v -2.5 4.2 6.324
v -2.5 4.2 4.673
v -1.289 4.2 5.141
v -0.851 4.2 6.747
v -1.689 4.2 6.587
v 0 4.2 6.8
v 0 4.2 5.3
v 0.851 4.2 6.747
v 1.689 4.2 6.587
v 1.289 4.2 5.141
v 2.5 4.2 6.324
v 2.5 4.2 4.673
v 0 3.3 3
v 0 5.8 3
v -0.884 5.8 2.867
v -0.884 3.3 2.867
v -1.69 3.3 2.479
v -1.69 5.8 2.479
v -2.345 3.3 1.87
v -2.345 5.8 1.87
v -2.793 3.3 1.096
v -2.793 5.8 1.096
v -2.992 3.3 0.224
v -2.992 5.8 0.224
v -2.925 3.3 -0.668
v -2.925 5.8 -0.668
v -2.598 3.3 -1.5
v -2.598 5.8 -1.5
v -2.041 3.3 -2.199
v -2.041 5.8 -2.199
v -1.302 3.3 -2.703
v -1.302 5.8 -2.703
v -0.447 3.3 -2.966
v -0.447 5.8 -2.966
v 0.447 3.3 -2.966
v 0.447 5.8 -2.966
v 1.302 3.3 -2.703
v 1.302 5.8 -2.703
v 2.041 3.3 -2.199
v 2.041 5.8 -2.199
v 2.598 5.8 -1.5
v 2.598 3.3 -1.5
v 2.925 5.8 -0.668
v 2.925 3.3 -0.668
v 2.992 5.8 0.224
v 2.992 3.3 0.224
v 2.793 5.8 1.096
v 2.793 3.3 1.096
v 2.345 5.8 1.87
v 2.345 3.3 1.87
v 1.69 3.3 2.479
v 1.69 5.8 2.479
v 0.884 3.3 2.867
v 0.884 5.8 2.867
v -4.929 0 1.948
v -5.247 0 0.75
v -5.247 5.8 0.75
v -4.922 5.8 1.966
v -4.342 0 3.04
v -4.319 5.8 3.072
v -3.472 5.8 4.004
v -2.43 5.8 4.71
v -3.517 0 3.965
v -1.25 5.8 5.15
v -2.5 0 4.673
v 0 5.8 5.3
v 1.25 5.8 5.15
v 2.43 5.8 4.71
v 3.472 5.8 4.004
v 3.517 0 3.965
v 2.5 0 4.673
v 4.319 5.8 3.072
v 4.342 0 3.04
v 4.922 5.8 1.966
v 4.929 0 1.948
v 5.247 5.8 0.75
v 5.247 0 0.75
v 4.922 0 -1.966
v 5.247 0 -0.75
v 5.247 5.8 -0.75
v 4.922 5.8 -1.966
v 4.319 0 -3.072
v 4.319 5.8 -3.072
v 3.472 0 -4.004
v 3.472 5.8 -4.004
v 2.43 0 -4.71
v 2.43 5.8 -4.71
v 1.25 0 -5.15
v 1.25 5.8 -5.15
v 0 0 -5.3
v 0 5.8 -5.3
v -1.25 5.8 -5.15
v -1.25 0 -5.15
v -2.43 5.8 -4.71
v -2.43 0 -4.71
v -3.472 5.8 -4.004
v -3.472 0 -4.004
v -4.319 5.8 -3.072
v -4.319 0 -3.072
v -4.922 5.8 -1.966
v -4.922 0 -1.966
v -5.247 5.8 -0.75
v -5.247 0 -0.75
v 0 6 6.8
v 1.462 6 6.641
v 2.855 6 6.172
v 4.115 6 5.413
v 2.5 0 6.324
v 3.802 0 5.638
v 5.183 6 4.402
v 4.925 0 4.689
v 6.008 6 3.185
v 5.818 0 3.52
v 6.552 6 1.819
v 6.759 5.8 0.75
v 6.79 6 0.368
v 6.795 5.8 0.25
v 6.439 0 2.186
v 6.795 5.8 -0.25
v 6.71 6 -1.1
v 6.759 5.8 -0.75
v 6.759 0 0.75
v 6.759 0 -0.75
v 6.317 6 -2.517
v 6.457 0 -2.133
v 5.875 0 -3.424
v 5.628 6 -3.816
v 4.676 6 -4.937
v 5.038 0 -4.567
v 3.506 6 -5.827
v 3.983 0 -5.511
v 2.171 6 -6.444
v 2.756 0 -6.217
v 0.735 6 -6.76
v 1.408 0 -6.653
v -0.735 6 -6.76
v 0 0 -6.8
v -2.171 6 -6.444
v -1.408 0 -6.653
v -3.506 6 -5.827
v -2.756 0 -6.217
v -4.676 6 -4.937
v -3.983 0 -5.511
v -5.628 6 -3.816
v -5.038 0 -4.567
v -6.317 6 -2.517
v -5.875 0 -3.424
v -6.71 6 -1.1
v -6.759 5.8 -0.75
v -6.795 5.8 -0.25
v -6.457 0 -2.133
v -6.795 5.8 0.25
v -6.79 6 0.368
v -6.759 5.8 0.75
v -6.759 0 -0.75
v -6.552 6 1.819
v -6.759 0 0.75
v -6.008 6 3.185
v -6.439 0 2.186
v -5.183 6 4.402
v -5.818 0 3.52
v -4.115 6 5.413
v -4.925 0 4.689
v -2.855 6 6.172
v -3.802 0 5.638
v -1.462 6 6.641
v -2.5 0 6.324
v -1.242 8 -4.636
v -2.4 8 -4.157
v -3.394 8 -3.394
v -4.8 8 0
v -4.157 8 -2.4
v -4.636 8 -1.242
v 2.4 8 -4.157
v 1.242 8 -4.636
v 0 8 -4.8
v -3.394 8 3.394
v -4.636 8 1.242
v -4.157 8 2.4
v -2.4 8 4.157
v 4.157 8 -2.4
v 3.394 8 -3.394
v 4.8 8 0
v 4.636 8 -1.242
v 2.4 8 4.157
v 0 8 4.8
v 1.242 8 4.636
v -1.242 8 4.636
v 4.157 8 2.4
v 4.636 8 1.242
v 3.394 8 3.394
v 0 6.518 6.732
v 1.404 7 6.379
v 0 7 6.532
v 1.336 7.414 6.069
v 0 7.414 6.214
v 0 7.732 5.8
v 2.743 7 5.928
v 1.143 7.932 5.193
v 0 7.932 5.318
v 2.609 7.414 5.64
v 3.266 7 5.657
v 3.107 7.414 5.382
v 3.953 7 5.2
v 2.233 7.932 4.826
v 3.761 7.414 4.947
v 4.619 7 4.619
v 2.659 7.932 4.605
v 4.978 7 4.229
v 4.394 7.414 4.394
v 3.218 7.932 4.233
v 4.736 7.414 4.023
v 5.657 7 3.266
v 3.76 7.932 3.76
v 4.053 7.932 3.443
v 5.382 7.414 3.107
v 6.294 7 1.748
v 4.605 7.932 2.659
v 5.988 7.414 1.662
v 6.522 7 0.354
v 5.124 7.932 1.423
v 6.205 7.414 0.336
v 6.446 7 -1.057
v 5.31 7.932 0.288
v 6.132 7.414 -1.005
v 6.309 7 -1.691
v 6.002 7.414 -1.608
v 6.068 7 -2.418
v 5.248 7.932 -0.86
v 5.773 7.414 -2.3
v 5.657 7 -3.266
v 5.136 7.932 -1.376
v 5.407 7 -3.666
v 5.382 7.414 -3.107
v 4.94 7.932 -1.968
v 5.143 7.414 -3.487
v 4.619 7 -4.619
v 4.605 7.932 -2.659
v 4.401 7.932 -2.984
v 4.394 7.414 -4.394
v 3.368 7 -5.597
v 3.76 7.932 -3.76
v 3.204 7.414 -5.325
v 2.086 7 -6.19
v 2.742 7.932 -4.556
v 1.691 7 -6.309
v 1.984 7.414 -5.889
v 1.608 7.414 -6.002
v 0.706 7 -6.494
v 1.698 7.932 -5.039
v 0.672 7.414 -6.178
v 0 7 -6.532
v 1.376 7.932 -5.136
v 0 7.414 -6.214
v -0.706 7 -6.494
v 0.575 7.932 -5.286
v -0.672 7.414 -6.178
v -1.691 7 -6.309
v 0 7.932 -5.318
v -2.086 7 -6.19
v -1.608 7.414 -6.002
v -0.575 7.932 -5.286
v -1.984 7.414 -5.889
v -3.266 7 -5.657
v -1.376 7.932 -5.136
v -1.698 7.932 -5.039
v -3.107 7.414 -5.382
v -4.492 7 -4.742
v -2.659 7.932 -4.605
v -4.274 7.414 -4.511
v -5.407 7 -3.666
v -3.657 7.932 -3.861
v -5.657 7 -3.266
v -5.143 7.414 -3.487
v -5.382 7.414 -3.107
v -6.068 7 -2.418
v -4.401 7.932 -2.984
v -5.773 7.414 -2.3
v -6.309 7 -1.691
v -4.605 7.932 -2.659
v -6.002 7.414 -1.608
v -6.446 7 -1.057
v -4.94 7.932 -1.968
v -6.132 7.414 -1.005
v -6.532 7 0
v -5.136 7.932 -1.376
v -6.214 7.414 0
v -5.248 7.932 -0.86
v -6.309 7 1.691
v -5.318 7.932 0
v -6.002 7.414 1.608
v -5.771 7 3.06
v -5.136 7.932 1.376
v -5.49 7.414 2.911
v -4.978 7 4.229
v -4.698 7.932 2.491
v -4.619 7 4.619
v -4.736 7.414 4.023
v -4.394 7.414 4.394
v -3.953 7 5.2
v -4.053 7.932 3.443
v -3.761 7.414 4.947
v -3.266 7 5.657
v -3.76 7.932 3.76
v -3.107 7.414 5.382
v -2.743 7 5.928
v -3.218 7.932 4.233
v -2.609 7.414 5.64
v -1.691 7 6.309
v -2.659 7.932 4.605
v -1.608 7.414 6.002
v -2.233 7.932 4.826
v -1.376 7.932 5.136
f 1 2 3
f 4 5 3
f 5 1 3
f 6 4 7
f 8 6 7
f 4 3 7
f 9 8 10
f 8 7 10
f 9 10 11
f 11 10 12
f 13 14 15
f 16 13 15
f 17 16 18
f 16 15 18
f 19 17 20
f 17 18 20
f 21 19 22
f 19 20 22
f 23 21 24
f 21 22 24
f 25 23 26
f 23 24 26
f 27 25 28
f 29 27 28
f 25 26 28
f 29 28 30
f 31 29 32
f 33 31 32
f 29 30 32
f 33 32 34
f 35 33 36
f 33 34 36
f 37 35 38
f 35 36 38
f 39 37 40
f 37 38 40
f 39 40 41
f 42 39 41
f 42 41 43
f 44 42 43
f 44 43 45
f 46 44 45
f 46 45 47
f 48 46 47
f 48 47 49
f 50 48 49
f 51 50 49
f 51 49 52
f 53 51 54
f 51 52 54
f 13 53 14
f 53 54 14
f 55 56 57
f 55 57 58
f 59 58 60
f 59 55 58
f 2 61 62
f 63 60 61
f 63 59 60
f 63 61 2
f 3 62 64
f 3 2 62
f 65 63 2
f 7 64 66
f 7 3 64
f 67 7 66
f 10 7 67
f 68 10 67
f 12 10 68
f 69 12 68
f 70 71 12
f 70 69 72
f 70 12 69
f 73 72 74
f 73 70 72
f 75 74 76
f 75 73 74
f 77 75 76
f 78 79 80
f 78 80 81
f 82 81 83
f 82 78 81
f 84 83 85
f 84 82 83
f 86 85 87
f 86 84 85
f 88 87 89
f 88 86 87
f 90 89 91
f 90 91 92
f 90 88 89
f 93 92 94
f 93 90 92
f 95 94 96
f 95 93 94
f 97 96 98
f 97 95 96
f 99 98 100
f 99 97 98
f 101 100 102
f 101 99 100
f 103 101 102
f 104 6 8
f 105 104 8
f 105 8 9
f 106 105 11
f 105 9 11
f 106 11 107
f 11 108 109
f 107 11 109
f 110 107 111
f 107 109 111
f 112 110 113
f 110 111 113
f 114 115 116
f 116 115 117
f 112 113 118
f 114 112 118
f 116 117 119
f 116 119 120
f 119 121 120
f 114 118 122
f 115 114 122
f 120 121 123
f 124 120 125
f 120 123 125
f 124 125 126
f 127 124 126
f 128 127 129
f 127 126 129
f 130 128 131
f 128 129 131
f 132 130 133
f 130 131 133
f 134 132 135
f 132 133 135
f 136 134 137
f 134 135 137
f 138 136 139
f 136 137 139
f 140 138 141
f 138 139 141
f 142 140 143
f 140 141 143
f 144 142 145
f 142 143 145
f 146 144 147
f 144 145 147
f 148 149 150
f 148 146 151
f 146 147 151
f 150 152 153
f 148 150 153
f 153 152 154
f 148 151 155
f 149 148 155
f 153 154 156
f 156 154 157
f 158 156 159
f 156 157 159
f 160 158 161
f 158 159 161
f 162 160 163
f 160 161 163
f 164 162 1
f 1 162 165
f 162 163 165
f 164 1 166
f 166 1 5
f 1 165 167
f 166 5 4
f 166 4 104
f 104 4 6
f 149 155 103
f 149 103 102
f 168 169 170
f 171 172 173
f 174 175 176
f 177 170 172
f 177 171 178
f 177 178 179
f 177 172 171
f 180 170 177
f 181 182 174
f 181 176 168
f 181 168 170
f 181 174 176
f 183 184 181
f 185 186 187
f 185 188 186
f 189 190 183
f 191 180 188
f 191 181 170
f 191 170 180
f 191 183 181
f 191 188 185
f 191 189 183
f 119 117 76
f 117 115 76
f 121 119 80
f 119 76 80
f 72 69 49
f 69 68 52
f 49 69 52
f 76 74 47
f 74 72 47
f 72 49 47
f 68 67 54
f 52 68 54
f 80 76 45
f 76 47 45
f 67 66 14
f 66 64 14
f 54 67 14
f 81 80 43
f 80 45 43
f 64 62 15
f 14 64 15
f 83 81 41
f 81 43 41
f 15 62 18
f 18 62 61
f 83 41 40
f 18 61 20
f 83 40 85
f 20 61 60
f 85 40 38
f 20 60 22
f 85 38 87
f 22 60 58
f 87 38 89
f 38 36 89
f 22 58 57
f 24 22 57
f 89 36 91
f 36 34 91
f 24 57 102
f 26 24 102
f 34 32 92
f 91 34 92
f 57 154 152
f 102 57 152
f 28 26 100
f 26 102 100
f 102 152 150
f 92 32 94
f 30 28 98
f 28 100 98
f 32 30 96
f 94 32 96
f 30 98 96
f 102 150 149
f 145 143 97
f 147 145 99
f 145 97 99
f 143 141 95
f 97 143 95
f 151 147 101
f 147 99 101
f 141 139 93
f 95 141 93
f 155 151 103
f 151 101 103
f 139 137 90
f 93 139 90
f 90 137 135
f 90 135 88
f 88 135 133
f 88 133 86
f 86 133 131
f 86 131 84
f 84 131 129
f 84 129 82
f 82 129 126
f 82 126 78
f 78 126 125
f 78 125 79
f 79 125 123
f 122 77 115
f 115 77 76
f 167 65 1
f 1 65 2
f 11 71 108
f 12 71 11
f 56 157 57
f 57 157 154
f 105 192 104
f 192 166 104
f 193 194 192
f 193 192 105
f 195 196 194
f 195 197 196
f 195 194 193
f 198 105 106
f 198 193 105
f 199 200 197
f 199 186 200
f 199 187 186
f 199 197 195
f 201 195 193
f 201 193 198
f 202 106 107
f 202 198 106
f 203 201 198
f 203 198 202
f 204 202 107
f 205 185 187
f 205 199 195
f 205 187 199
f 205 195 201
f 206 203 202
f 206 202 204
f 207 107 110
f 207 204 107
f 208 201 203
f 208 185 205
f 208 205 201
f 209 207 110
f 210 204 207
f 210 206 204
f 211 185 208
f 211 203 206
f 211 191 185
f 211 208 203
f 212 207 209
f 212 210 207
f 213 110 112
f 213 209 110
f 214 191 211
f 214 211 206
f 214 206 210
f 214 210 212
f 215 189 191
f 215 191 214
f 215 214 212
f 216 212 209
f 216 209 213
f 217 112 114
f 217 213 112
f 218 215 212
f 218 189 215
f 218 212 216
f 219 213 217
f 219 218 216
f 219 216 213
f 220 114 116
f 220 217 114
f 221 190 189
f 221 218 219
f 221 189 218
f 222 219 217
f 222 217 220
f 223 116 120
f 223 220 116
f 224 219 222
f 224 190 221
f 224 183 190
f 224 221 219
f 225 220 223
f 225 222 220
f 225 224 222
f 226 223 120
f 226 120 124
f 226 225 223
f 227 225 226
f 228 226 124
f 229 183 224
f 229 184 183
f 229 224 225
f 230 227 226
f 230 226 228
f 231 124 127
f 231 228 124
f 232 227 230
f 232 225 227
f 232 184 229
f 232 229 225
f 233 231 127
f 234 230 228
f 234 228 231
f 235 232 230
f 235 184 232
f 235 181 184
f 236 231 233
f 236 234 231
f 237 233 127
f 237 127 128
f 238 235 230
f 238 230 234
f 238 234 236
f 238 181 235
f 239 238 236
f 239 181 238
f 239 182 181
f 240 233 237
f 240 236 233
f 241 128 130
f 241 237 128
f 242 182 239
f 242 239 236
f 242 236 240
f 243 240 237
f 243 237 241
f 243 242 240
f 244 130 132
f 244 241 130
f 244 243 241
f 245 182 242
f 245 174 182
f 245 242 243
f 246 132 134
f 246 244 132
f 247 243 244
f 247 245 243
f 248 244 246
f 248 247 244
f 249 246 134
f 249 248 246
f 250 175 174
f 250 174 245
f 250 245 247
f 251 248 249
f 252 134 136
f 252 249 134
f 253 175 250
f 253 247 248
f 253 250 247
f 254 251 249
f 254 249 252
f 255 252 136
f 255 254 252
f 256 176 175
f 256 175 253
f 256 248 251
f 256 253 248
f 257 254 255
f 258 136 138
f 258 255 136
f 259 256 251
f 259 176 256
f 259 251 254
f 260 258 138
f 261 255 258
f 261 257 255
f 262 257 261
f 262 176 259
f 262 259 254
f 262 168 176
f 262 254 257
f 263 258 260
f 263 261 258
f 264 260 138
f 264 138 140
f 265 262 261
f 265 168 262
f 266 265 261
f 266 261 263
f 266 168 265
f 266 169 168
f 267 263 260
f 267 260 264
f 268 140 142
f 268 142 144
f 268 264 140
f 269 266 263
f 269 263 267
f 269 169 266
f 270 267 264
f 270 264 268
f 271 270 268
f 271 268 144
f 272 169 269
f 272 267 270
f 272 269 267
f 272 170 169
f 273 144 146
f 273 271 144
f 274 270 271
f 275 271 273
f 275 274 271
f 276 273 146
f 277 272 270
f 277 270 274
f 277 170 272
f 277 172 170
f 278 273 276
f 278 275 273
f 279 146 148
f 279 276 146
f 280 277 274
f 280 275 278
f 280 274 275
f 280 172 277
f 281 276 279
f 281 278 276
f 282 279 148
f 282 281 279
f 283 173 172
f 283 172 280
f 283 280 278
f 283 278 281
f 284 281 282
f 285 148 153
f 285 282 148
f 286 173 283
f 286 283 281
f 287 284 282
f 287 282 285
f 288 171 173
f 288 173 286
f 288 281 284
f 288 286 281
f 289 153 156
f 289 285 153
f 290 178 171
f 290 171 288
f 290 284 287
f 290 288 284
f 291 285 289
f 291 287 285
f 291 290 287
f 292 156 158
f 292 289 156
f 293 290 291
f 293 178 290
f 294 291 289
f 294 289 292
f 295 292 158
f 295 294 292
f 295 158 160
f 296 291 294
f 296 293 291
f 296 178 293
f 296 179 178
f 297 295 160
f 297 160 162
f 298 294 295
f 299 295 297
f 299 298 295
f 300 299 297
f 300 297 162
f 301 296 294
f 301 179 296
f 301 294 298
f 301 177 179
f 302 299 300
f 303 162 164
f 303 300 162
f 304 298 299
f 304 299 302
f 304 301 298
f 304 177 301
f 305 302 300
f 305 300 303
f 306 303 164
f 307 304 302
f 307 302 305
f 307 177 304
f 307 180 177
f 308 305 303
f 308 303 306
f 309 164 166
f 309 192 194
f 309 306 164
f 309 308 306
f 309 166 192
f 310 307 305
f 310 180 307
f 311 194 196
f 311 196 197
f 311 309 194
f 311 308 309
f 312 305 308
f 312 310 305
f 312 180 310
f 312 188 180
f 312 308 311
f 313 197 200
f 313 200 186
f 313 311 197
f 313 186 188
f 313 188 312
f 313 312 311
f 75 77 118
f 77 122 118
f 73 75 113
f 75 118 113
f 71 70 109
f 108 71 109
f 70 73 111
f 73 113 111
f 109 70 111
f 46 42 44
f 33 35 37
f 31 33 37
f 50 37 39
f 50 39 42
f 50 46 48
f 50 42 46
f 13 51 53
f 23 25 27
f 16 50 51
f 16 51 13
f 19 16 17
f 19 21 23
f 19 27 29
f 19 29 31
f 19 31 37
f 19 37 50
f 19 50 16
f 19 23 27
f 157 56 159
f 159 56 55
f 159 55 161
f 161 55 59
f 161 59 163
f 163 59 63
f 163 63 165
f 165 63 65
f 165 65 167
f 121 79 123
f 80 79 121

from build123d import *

# Parameters (mm, degrees)
SKETCH1_R               = 6.8
SKETCH1_R_2             = 5.3
BOSS_EXTRUDE1_DEPTH     = 5.8
SKETCH2_R               = 6.8
BOSS_EXTRUDE2_DEPTH     = 2.2
FILLET1_R               = 2
SKETCH4_W               = 5
SKETCH4_H               = 4.2
CUT_EXTRUDE1_DEPTH      = 13.509196726
CUT_EXTRUDE2_DEPTH      = 13.509196726
CUT_EXTRUDE2_DEPTH_BACK = 13.509196726
SKETCH5_W               = 1.5
SKETCH5_H               = 5.8
SKETCH3_R               = 3
BOSS_EXTRUDE3_DEPTH     = 2.5


with BuildPart() as part:
    # Sketch1 → Boss-Extrude1 (new body)
    with BuildSketch(Plane(origin=(0, 0, 0), x_dir=(1, 0, 0), z_dir=(0, 1, 0))):
        with Locations(Location((0, 0, 0), (0, 0, 270))):
            Circle(SKETCH1_R)
        with Locations(Location((0, 0, 0), (0, 0, 270))):
            Circle(SKETCH1_R_2, mode=Mode.SUBTRACT)
    extrude(amount=BOSS_EXTRUDE1_DEPTH)

    # Sketch2 → Boss-Extrude2 (add)
    with BuildSketch(Plane(origin=(0, 5.8, 0), x_dir=(1, 0, 0), z_dir=(0, 1, 0))):
        with Locations(Location((0, 0, 0), (0, 0, 270))):
            Circle(SKETCH2_R)
    extrude(amount=BOSS_EXTRUDE2_DEPTH)

    # Fillet1
    fillet1_edges = [part.edges().sort_by_distance(p)[0] for p in [
        (0, 8, -6.8),
    ]]
    fillet(fillet1_edges, radius=FILLET1_R)

    # Sketch4 → Cut-Extrude1 (cut, through all)
    with BuildSketch(Plane.XY):
        with Locations((0, 2.1)):
            Rectangle(SKETCH4_W, SKETCH4_H)
    extrude(amount=CUT_EXTRUDE1_DEPTH, mode=Mode.SUBTRACT)

    # Sketch5 → Cut-Extrude2 (cut, two sides: drawn at the far end of the back side and taken through both)
    with BuildSketch(Plane(origin=(0, 0, 0), x_dir=(0, 0, -1), z_dir=(1, 0, 0)).offset(-CUT_EXTRUDE2_DEPTH_BACK)):
        with Locations((0, 2.9)):
            Rectangle(SKETCH5_W, SKETCH5_H)
    extrude(amount=CUT_EXTRUDE2_DEPTH + CUT_EXTRUDE2_DEPTH_BACK, mode=Mode.SUBTRACT)

    # Sketch3 → Boss-Extrude3 (add)
    with BuildSketch(Plane.XZ.offset(-5.8)):
        with Locations(Location((0, 0, 0), (0, 0, 90))):
            Circle(SKETCH3_R)
    extrude(amount=BOSS_EXTRUDE3_DEPTH)


solid = part.part
